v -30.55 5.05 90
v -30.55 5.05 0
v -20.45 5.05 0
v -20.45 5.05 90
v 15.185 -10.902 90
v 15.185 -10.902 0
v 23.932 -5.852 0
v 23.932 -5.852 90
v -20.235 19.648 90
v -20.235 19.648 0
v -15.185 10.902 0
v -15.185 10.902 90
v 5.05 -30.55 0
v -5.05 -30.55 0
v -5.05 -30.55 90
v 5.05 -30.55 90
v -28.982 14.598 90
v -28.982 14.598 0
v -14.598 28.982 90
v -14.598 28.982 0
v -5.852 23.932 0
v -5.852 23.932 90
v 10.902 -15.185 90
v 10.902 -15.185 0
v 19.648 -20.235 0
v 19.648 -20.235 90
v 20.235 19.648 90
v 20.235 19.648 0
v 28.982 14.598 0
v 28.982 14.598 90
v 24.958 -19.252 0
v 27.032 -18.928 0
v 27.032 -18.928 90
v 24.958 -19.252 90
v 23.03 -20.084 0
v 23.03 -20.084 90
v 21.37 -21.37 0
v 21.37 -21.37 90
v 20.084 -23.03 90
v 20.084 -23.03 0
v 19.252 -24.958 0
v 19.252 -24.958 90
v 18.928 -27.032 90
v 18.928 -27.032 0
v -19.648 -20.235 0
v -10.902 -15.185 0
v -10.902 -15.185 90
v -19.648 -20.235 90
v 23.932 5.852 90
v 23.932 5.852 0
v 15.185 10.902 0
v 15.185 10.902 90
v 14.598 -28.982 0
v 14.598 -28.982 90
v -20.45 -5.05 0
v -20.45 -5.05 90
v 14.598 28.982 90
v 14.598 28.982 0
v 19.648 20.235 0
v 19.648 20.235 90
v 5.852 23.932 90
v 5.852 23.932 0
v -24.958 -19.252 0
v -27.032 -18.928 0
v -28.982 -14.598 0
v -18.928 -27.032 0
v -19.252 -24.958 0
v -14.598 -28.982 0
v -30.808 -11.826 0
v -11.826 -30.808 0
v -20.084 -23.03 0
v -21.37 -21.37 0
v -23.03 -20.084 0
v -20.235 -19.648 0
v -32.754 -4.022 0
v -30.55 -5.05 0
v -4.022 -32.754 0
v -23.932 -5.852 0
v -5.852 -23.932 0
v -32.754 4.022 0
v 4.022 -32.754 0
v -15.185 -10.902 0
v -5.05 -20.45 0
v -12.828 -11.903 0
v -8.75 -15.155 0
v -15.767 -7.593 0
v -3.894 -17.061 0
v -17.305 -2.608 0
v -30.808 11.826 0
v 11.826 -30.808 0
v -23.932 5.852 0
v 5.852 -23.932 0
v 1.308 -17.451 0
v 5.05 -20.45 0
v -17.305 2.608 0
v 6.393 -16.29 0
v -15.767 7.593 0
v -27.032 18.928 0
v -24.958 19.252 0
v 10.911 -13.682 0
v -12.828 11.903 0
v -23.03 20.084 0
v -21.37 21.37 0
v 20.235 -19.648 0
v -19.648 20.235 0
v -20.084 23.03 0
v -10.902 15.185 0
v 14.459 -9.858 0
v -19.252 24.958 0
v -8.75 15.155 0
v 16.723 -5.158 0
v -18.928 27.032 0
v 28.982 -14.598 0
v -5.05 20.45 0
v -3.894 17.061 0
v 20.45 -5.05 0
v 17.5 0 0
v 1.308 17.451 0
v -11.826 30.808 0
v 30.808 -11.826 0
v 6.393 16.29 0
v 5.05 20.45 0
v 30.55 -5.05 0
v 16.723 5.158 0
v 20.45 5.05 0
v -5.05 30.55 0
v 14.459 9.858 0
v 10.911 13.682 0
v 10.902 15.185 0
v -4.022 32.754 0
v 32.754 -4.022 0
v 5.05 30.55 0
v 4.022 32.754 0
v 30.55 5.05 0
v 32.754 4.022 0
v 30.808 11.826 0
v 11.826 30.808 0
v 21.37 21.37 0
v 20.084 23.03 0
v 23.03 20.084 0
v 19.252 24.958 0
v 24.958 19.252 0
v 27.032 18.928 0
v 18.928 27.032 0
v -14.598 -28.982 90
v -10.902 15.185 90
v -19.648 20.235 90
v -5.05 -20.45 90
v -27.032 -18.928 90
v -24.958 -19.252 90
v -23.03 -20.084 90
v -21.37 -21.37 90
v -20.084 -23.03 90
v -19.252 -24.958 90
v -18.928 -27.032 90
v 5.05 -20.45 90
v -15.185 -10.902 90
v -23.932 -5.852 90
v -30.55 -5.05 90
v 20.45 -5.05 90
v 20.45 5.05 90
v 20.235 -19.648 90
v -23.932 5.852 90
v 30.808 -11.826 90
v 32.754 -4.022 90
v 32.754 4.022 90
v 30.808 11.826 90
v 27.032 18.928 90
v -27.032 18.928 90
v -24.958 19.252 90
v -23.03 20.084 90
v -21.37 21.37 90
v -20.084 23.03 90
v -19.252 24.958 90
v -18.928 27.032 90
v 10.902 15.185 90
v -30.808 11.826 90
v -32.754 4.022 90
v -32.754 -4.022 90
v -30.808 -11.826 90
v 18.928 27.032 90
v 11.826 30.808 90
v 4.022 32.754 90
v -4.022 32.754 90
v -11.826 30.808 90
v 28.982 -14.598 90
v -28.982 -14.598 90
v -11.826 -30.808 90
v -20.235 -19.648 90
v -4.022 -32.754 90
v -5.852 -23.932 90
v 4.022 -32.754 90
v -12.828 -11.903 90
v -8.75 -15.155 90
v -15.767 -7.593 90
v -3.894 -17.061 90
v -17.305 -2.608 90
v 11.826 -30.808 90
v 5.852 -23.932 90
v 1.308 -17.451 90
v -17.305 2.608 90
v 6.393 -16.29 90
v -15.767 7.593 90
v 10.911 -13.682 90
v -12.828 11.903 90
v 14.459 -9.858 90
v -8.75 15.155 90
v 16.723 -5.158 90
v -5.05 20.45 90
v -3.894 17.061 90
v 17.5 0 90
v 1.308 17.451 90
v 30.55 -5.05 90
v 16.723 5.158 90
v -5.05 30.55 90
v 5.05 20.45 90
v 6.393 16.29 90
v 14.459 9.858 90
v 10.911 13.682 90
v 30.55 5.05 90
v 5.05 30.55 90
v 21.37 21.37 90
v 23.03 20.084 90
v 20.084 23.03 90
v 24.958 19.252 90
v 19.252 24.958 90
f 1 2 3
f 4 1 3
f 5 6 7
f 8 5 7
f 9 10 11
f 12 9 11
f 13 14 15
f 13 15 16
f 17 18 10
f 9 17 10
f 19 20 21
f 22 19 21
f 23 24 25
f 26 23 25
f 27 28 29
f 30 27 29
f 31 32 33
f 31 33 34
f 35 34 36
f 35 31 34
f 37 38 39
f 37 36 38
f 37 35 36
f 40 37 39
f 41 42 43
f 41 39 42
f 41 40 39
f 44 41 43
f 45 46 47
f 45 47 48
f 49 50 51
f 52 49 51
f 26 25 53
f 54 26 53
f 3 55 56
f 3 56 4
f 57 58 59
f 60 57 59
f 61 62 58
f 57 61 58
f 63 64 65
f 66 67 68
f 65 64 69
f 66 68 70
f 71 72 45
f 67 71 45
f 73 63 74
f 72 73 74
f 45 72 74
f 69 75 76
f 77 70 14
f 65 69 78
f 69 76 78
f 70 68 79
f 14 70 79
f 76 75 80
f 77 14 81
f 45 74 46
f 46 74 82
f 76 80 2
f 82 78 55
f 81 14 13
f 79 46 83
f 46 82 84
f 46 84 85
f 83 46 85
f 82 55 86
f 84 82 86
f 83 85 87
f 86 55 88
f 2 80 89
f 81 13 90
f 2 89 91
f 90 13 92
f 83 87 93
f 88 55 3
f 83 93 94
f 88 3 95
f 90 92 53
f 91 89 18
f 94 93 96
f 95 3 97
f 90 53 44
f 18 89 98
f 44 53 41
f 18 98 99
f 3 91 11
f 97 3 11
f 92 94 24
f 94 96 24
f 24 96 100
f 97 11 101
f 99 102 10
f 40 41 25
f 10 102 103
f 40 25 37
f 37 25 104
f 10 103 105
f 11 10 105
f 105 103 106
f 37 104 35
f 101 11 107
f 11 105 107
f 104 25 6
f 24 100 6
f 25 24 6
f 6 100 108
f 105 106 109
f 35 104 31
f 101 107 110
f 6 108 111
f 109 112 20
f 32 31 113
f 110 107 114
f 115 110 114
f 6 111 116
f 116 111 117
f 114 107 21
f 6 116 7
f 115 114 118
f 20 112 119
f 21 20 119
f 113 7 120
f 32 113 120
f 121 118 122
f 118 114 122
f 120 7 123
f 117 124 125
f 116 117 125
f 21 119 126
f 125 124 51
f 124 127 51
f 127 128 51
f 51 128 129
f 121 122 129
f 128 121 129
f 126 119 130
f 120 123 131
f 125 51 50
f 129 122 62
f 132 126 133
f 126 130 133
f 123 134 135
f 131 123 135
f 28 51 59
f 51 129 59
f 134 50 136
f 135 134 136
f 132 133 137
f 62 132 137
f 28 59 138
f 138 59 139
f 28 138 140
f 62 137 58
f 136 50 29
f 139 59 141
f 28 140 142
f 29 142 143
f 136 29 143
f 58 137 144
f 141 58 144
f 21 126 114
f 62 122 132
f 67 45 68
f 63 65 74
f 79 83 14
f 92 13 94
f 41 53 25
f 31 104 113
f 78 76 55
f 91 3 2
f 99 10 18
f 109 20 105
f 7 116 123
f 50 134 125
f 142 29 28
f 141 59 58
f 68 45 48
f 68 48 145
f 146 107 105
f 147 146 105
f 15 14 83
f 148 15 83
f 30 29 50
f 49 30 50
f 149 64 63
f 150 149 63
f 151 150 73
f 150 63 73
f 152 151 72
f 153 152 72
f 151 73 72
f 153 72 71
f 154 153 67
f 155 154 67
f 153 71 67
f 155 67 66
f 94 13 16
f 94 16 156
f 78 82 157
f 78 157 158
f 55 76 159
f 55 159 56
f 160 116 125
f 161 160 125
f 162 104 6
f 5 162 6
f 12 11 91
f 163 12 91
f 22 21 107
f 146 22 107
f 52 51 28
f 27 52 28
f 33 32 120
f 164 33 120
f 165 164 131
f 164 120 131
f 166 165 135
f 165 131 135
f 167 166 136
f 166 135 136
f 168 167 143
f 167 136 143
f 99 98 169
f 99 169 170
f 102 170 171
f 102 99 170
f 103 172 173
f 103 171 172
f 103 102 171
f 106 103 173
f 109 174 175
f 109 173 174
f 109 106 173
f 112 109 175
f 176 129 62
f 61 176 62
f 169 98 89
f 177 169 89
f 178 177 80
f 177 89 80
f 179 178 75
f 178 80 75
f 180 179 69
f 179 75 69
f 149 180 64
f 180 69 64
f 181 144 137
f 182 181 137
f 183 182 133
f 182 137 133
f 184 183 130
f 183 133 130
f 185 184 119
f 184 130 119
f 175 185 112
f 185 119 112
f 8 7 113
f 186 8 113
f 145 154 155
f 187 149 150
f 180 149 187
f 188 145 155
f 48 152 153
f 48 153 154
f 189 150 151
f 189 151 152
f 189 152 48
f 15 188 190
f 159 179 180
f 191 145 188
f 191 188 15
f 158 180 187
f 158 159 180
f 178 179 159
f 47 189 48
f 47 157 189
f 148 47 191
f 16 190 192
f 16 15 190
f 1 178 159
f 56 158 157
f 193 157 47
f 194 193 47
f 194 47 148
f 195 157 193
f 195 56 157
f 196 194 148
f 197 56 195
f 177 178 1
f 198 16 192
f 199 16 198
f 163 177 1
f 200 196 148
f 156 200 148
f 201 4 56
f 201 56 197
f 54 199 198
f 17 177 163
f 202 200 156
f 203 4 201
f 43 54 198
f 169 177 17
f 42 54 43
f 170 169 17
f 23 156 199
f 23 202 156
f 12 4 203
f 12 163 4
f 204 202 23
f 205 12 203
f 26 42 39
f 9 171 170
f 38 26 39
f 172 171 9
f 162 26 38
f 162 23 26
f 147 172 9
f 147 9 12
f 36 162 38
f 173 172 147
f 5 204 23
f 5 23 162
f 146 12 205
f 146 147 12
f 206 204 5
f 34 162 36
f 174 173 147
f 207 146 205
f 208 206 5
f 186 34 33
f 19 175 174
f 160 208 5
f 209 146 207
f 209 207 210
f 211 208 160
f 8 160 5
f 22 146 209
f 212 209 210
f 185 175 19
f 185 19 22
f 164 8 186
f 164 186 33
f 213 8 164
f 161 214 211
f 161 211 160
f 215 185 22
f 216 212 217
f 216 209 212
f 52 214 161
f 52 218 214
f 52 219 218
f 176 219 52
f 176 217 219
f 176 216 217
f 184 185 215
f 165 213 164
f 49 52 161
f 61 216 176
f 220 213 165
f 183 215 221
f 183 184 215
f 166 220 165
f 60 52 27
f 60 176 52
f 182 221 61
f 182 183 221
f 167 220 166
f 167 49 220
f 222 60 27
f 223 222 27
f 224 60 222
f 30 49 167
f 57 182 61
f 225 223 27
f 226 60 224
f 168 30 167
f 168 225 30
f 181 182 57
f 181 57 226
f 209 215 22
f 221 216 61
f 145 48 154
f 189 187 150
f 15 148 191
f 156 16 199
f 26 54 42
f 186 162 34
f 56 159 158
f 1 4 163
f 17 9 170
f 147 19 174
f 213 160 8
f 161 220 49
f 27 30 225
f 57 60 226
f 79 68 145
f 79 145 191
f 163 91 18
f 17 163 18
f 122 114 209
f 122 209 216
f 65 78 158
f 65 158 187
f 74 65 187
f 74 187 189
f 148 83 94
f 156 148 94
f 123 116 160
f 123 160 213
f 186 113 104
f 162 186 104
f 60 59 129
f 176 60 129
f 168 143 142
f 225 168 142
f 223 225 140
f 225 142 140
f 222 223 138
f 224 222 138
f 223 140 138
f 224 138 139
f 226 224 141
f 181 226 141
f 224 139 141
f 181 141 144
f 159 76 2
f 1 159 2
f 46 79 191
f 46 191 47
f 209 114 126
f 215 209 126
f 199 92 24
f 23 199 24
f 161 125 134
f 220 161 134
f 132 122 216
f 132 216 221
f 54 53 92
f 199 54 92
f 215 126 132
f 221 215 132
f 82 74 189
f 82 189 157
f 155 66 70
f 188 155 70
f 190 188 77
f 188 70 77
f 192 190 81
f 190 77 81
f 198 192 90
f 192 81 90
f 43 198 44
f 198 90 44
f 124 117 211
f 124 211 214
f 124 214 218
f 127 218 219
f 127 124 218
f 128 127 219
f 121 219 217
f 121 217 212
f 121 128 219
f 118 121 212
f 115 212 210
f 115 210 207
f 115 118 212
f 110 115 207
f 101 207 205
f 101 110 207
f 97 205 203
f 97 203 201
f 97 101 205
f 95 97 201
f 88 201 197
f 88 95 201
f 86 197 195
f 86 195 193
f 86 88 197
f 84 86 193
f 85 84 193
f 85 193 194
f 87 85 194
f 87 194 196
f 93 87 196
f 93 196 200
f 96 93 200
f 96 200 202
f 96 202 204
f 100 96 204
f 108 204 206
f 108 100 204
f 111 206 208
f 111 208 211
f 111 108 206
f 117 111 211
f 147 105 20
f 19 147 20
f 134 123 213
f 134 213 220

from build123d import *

# Parameters (mm, degrees)
SKETCH1_R            = 33
SKETCH1_R_2          = 17.5
SKETCH1_W            = 10.1
SKETCH1_H            = 10.1
BOSS_EXTRUDE1_DEPTH  = 90
CUT_EXTRUDE1_START   = -91
CUT_EXTRUDE1_DEPTH   = 92
MIRROR2_START        = -91
MIRROR2_COPY_1_DEPTH = 92


with BuildPart() as part:
    # Sketch1 → Boss-Extrude1 (new body)
    with BuildSketch(Plane.XY):
        Circle(SKETCH1_R)
        Circle(SKETCH1_R_2, mode=Mode.SUBTRACT)
        Polygon((15.185219507, 10.901571711), (20.235219507, 19.648428289), (28.982076086, 14.598428289), (23.932076086, 5.851571711), align=None, mode=Mode.SUBTRACT)
        with Locations((25.5, 0)):
            Rectangle(SKETCH1_W, SKETCH1_H, mode=Mode.SUBTRACT)
        Polygon((5.851571711, 23.932076086), (14.598428289, 28.982076086), (19.648428289, 20.235219507), (10.901571711, 15.185219507), align=None, mode=Mode.SUBTRACT)
        with Locations((0, 25.5)):
            Rectangle(SKETCH1_W, SKETCH1_H, mode=Mode.SUBTRACT)
        with Locations((-25.5, 0)):
            Rectangle(SKETCH1_W, SKETCH1_H, mode=Mode.SUBTRACT)
        Polygon((-23.932076086, 5.851571711), (-28.982076086, 14.598428289), (-20.235219507, 19.648428289), (-15.185219507, 10.901571711), align=None, mode=Mode.SUBTRACT)
        Polygon((-10.901571711, 15.185219507), (-19.648428289, 20.235219507), (-14.598428289, 28.982076086), (-5.851571711, 23.932076086), align=None, mode=Mode.SUBTRACT)
        Polygon((23.932076086, -5.851571711), (28.982076086, -14.598428289), (20.235219507, -19.648428289), (15.185219507, -10.901571711), align=None, mode=Mode.SUBTRACT)
        Polygon((10.901571711, -15.185219507), (19.648428289, -20.235219507), (14.598428289, -28.982076086), (5.851571711, -23.932076086), align=None, mode=Mode.SUBTRACT)
        with Locations((0, -25.5)):
            Rectangle(SKETCH1_W, SKETCH1_H, mode=Mode.SUBTRACT)
        Polygon((-5.851571711, -23.932076086), (-10.901571711, -15.185219507), (-19.648428289, -20.235219507), (-14.598428289, -28.982076086), align=None, mode=Mode.SUBTRACT)
        Polygon((-15.185219507, -10.901571711), (-23.932076086, -5.851571711), (-28.982076086, -14.598428289), (-20.235219507, -19.648428289), align=None, mode=Mode.SUBTRACT)
    extrude(amount=BOSS_EXTRUDE1_DEPTH)

    # Sketch2 → Cut-Extrude1 (cut)
    with BuildSketch(Plane.XY.offset(90).offset(CUT_EXTRUDE1_START)):
        with BuildLine():
            Line((-195.710732602, 14.035729655), (-27.032017462, 18.9280224))
            ThreePointArc((-27.032017462, 18.9280224), (-21.370045373, 21.370045373), (-18.9280224, 27.032017462))
            Line((-18.9280224, 27.032017462), (-14.035729655, 195.710732602))
            Line((-14.035729655, 195.710732602), (-252.683769537, 434.358772484))
            Line((-252.683769537, 434.358772484), (-434.358772484, 252.683769537))
            Line((-434.358772484, 252.683769537), (-195.710732602, 14.035729655))
        make_face()
    cut_extrude1 = extrude(amount=CUT_EXTRUDE1_DEPTH, mode=Mode.SUBTRACT)

    # Mirror1: Cut-Extrude1 across plane
    add(cut_extrude1.mirror(Plane(origin=(0, 0, 0), x_dir=(0, 0, 1), z_dir=(1, 0, 0))), mode=Mode.SUBTRACT)

    # Mirror2: Cut-Extrude1 across plane
    add(cut_extrude1.mirror(Plane.ZX), mode=Mode.SUBTRACT)

    # Mirror2 copy 1 sketch → Mirror2 copy 1 (cut)
    with BuildSketch(Plane(origin=(0, 0, 90), x_dir=(-1, 0, 0), z_dir=(0, 0, 1)).offset(MIRROR2_START)):
        with BuildLine():
            Line((-195.710732602, 14.035729655), (-27.032017462, 18.9280224))
            ThreePointArc((-27.032017462, 18.9280224), (-21.370045373, 21.370045373), (-18.9280224, 27.032017462))
            Line((-18.9280224, 27.032017462), (-14.035729655, 195.710732602))
            Line((-14.035729655, 195.710732602), (-252.683769537, 434.358772484))
            Line((-252.683769537, 434.358772484), (-434.358772484, 252.683769537))
            Line((-434.358772484, 252.683769537), (-195.710732602, 14.035729655))
        make_face()
    extrude(amount=MIRROR2_COPY_1_DEPTH, mode=Mode.SUBTRACT)


solid = part.part
